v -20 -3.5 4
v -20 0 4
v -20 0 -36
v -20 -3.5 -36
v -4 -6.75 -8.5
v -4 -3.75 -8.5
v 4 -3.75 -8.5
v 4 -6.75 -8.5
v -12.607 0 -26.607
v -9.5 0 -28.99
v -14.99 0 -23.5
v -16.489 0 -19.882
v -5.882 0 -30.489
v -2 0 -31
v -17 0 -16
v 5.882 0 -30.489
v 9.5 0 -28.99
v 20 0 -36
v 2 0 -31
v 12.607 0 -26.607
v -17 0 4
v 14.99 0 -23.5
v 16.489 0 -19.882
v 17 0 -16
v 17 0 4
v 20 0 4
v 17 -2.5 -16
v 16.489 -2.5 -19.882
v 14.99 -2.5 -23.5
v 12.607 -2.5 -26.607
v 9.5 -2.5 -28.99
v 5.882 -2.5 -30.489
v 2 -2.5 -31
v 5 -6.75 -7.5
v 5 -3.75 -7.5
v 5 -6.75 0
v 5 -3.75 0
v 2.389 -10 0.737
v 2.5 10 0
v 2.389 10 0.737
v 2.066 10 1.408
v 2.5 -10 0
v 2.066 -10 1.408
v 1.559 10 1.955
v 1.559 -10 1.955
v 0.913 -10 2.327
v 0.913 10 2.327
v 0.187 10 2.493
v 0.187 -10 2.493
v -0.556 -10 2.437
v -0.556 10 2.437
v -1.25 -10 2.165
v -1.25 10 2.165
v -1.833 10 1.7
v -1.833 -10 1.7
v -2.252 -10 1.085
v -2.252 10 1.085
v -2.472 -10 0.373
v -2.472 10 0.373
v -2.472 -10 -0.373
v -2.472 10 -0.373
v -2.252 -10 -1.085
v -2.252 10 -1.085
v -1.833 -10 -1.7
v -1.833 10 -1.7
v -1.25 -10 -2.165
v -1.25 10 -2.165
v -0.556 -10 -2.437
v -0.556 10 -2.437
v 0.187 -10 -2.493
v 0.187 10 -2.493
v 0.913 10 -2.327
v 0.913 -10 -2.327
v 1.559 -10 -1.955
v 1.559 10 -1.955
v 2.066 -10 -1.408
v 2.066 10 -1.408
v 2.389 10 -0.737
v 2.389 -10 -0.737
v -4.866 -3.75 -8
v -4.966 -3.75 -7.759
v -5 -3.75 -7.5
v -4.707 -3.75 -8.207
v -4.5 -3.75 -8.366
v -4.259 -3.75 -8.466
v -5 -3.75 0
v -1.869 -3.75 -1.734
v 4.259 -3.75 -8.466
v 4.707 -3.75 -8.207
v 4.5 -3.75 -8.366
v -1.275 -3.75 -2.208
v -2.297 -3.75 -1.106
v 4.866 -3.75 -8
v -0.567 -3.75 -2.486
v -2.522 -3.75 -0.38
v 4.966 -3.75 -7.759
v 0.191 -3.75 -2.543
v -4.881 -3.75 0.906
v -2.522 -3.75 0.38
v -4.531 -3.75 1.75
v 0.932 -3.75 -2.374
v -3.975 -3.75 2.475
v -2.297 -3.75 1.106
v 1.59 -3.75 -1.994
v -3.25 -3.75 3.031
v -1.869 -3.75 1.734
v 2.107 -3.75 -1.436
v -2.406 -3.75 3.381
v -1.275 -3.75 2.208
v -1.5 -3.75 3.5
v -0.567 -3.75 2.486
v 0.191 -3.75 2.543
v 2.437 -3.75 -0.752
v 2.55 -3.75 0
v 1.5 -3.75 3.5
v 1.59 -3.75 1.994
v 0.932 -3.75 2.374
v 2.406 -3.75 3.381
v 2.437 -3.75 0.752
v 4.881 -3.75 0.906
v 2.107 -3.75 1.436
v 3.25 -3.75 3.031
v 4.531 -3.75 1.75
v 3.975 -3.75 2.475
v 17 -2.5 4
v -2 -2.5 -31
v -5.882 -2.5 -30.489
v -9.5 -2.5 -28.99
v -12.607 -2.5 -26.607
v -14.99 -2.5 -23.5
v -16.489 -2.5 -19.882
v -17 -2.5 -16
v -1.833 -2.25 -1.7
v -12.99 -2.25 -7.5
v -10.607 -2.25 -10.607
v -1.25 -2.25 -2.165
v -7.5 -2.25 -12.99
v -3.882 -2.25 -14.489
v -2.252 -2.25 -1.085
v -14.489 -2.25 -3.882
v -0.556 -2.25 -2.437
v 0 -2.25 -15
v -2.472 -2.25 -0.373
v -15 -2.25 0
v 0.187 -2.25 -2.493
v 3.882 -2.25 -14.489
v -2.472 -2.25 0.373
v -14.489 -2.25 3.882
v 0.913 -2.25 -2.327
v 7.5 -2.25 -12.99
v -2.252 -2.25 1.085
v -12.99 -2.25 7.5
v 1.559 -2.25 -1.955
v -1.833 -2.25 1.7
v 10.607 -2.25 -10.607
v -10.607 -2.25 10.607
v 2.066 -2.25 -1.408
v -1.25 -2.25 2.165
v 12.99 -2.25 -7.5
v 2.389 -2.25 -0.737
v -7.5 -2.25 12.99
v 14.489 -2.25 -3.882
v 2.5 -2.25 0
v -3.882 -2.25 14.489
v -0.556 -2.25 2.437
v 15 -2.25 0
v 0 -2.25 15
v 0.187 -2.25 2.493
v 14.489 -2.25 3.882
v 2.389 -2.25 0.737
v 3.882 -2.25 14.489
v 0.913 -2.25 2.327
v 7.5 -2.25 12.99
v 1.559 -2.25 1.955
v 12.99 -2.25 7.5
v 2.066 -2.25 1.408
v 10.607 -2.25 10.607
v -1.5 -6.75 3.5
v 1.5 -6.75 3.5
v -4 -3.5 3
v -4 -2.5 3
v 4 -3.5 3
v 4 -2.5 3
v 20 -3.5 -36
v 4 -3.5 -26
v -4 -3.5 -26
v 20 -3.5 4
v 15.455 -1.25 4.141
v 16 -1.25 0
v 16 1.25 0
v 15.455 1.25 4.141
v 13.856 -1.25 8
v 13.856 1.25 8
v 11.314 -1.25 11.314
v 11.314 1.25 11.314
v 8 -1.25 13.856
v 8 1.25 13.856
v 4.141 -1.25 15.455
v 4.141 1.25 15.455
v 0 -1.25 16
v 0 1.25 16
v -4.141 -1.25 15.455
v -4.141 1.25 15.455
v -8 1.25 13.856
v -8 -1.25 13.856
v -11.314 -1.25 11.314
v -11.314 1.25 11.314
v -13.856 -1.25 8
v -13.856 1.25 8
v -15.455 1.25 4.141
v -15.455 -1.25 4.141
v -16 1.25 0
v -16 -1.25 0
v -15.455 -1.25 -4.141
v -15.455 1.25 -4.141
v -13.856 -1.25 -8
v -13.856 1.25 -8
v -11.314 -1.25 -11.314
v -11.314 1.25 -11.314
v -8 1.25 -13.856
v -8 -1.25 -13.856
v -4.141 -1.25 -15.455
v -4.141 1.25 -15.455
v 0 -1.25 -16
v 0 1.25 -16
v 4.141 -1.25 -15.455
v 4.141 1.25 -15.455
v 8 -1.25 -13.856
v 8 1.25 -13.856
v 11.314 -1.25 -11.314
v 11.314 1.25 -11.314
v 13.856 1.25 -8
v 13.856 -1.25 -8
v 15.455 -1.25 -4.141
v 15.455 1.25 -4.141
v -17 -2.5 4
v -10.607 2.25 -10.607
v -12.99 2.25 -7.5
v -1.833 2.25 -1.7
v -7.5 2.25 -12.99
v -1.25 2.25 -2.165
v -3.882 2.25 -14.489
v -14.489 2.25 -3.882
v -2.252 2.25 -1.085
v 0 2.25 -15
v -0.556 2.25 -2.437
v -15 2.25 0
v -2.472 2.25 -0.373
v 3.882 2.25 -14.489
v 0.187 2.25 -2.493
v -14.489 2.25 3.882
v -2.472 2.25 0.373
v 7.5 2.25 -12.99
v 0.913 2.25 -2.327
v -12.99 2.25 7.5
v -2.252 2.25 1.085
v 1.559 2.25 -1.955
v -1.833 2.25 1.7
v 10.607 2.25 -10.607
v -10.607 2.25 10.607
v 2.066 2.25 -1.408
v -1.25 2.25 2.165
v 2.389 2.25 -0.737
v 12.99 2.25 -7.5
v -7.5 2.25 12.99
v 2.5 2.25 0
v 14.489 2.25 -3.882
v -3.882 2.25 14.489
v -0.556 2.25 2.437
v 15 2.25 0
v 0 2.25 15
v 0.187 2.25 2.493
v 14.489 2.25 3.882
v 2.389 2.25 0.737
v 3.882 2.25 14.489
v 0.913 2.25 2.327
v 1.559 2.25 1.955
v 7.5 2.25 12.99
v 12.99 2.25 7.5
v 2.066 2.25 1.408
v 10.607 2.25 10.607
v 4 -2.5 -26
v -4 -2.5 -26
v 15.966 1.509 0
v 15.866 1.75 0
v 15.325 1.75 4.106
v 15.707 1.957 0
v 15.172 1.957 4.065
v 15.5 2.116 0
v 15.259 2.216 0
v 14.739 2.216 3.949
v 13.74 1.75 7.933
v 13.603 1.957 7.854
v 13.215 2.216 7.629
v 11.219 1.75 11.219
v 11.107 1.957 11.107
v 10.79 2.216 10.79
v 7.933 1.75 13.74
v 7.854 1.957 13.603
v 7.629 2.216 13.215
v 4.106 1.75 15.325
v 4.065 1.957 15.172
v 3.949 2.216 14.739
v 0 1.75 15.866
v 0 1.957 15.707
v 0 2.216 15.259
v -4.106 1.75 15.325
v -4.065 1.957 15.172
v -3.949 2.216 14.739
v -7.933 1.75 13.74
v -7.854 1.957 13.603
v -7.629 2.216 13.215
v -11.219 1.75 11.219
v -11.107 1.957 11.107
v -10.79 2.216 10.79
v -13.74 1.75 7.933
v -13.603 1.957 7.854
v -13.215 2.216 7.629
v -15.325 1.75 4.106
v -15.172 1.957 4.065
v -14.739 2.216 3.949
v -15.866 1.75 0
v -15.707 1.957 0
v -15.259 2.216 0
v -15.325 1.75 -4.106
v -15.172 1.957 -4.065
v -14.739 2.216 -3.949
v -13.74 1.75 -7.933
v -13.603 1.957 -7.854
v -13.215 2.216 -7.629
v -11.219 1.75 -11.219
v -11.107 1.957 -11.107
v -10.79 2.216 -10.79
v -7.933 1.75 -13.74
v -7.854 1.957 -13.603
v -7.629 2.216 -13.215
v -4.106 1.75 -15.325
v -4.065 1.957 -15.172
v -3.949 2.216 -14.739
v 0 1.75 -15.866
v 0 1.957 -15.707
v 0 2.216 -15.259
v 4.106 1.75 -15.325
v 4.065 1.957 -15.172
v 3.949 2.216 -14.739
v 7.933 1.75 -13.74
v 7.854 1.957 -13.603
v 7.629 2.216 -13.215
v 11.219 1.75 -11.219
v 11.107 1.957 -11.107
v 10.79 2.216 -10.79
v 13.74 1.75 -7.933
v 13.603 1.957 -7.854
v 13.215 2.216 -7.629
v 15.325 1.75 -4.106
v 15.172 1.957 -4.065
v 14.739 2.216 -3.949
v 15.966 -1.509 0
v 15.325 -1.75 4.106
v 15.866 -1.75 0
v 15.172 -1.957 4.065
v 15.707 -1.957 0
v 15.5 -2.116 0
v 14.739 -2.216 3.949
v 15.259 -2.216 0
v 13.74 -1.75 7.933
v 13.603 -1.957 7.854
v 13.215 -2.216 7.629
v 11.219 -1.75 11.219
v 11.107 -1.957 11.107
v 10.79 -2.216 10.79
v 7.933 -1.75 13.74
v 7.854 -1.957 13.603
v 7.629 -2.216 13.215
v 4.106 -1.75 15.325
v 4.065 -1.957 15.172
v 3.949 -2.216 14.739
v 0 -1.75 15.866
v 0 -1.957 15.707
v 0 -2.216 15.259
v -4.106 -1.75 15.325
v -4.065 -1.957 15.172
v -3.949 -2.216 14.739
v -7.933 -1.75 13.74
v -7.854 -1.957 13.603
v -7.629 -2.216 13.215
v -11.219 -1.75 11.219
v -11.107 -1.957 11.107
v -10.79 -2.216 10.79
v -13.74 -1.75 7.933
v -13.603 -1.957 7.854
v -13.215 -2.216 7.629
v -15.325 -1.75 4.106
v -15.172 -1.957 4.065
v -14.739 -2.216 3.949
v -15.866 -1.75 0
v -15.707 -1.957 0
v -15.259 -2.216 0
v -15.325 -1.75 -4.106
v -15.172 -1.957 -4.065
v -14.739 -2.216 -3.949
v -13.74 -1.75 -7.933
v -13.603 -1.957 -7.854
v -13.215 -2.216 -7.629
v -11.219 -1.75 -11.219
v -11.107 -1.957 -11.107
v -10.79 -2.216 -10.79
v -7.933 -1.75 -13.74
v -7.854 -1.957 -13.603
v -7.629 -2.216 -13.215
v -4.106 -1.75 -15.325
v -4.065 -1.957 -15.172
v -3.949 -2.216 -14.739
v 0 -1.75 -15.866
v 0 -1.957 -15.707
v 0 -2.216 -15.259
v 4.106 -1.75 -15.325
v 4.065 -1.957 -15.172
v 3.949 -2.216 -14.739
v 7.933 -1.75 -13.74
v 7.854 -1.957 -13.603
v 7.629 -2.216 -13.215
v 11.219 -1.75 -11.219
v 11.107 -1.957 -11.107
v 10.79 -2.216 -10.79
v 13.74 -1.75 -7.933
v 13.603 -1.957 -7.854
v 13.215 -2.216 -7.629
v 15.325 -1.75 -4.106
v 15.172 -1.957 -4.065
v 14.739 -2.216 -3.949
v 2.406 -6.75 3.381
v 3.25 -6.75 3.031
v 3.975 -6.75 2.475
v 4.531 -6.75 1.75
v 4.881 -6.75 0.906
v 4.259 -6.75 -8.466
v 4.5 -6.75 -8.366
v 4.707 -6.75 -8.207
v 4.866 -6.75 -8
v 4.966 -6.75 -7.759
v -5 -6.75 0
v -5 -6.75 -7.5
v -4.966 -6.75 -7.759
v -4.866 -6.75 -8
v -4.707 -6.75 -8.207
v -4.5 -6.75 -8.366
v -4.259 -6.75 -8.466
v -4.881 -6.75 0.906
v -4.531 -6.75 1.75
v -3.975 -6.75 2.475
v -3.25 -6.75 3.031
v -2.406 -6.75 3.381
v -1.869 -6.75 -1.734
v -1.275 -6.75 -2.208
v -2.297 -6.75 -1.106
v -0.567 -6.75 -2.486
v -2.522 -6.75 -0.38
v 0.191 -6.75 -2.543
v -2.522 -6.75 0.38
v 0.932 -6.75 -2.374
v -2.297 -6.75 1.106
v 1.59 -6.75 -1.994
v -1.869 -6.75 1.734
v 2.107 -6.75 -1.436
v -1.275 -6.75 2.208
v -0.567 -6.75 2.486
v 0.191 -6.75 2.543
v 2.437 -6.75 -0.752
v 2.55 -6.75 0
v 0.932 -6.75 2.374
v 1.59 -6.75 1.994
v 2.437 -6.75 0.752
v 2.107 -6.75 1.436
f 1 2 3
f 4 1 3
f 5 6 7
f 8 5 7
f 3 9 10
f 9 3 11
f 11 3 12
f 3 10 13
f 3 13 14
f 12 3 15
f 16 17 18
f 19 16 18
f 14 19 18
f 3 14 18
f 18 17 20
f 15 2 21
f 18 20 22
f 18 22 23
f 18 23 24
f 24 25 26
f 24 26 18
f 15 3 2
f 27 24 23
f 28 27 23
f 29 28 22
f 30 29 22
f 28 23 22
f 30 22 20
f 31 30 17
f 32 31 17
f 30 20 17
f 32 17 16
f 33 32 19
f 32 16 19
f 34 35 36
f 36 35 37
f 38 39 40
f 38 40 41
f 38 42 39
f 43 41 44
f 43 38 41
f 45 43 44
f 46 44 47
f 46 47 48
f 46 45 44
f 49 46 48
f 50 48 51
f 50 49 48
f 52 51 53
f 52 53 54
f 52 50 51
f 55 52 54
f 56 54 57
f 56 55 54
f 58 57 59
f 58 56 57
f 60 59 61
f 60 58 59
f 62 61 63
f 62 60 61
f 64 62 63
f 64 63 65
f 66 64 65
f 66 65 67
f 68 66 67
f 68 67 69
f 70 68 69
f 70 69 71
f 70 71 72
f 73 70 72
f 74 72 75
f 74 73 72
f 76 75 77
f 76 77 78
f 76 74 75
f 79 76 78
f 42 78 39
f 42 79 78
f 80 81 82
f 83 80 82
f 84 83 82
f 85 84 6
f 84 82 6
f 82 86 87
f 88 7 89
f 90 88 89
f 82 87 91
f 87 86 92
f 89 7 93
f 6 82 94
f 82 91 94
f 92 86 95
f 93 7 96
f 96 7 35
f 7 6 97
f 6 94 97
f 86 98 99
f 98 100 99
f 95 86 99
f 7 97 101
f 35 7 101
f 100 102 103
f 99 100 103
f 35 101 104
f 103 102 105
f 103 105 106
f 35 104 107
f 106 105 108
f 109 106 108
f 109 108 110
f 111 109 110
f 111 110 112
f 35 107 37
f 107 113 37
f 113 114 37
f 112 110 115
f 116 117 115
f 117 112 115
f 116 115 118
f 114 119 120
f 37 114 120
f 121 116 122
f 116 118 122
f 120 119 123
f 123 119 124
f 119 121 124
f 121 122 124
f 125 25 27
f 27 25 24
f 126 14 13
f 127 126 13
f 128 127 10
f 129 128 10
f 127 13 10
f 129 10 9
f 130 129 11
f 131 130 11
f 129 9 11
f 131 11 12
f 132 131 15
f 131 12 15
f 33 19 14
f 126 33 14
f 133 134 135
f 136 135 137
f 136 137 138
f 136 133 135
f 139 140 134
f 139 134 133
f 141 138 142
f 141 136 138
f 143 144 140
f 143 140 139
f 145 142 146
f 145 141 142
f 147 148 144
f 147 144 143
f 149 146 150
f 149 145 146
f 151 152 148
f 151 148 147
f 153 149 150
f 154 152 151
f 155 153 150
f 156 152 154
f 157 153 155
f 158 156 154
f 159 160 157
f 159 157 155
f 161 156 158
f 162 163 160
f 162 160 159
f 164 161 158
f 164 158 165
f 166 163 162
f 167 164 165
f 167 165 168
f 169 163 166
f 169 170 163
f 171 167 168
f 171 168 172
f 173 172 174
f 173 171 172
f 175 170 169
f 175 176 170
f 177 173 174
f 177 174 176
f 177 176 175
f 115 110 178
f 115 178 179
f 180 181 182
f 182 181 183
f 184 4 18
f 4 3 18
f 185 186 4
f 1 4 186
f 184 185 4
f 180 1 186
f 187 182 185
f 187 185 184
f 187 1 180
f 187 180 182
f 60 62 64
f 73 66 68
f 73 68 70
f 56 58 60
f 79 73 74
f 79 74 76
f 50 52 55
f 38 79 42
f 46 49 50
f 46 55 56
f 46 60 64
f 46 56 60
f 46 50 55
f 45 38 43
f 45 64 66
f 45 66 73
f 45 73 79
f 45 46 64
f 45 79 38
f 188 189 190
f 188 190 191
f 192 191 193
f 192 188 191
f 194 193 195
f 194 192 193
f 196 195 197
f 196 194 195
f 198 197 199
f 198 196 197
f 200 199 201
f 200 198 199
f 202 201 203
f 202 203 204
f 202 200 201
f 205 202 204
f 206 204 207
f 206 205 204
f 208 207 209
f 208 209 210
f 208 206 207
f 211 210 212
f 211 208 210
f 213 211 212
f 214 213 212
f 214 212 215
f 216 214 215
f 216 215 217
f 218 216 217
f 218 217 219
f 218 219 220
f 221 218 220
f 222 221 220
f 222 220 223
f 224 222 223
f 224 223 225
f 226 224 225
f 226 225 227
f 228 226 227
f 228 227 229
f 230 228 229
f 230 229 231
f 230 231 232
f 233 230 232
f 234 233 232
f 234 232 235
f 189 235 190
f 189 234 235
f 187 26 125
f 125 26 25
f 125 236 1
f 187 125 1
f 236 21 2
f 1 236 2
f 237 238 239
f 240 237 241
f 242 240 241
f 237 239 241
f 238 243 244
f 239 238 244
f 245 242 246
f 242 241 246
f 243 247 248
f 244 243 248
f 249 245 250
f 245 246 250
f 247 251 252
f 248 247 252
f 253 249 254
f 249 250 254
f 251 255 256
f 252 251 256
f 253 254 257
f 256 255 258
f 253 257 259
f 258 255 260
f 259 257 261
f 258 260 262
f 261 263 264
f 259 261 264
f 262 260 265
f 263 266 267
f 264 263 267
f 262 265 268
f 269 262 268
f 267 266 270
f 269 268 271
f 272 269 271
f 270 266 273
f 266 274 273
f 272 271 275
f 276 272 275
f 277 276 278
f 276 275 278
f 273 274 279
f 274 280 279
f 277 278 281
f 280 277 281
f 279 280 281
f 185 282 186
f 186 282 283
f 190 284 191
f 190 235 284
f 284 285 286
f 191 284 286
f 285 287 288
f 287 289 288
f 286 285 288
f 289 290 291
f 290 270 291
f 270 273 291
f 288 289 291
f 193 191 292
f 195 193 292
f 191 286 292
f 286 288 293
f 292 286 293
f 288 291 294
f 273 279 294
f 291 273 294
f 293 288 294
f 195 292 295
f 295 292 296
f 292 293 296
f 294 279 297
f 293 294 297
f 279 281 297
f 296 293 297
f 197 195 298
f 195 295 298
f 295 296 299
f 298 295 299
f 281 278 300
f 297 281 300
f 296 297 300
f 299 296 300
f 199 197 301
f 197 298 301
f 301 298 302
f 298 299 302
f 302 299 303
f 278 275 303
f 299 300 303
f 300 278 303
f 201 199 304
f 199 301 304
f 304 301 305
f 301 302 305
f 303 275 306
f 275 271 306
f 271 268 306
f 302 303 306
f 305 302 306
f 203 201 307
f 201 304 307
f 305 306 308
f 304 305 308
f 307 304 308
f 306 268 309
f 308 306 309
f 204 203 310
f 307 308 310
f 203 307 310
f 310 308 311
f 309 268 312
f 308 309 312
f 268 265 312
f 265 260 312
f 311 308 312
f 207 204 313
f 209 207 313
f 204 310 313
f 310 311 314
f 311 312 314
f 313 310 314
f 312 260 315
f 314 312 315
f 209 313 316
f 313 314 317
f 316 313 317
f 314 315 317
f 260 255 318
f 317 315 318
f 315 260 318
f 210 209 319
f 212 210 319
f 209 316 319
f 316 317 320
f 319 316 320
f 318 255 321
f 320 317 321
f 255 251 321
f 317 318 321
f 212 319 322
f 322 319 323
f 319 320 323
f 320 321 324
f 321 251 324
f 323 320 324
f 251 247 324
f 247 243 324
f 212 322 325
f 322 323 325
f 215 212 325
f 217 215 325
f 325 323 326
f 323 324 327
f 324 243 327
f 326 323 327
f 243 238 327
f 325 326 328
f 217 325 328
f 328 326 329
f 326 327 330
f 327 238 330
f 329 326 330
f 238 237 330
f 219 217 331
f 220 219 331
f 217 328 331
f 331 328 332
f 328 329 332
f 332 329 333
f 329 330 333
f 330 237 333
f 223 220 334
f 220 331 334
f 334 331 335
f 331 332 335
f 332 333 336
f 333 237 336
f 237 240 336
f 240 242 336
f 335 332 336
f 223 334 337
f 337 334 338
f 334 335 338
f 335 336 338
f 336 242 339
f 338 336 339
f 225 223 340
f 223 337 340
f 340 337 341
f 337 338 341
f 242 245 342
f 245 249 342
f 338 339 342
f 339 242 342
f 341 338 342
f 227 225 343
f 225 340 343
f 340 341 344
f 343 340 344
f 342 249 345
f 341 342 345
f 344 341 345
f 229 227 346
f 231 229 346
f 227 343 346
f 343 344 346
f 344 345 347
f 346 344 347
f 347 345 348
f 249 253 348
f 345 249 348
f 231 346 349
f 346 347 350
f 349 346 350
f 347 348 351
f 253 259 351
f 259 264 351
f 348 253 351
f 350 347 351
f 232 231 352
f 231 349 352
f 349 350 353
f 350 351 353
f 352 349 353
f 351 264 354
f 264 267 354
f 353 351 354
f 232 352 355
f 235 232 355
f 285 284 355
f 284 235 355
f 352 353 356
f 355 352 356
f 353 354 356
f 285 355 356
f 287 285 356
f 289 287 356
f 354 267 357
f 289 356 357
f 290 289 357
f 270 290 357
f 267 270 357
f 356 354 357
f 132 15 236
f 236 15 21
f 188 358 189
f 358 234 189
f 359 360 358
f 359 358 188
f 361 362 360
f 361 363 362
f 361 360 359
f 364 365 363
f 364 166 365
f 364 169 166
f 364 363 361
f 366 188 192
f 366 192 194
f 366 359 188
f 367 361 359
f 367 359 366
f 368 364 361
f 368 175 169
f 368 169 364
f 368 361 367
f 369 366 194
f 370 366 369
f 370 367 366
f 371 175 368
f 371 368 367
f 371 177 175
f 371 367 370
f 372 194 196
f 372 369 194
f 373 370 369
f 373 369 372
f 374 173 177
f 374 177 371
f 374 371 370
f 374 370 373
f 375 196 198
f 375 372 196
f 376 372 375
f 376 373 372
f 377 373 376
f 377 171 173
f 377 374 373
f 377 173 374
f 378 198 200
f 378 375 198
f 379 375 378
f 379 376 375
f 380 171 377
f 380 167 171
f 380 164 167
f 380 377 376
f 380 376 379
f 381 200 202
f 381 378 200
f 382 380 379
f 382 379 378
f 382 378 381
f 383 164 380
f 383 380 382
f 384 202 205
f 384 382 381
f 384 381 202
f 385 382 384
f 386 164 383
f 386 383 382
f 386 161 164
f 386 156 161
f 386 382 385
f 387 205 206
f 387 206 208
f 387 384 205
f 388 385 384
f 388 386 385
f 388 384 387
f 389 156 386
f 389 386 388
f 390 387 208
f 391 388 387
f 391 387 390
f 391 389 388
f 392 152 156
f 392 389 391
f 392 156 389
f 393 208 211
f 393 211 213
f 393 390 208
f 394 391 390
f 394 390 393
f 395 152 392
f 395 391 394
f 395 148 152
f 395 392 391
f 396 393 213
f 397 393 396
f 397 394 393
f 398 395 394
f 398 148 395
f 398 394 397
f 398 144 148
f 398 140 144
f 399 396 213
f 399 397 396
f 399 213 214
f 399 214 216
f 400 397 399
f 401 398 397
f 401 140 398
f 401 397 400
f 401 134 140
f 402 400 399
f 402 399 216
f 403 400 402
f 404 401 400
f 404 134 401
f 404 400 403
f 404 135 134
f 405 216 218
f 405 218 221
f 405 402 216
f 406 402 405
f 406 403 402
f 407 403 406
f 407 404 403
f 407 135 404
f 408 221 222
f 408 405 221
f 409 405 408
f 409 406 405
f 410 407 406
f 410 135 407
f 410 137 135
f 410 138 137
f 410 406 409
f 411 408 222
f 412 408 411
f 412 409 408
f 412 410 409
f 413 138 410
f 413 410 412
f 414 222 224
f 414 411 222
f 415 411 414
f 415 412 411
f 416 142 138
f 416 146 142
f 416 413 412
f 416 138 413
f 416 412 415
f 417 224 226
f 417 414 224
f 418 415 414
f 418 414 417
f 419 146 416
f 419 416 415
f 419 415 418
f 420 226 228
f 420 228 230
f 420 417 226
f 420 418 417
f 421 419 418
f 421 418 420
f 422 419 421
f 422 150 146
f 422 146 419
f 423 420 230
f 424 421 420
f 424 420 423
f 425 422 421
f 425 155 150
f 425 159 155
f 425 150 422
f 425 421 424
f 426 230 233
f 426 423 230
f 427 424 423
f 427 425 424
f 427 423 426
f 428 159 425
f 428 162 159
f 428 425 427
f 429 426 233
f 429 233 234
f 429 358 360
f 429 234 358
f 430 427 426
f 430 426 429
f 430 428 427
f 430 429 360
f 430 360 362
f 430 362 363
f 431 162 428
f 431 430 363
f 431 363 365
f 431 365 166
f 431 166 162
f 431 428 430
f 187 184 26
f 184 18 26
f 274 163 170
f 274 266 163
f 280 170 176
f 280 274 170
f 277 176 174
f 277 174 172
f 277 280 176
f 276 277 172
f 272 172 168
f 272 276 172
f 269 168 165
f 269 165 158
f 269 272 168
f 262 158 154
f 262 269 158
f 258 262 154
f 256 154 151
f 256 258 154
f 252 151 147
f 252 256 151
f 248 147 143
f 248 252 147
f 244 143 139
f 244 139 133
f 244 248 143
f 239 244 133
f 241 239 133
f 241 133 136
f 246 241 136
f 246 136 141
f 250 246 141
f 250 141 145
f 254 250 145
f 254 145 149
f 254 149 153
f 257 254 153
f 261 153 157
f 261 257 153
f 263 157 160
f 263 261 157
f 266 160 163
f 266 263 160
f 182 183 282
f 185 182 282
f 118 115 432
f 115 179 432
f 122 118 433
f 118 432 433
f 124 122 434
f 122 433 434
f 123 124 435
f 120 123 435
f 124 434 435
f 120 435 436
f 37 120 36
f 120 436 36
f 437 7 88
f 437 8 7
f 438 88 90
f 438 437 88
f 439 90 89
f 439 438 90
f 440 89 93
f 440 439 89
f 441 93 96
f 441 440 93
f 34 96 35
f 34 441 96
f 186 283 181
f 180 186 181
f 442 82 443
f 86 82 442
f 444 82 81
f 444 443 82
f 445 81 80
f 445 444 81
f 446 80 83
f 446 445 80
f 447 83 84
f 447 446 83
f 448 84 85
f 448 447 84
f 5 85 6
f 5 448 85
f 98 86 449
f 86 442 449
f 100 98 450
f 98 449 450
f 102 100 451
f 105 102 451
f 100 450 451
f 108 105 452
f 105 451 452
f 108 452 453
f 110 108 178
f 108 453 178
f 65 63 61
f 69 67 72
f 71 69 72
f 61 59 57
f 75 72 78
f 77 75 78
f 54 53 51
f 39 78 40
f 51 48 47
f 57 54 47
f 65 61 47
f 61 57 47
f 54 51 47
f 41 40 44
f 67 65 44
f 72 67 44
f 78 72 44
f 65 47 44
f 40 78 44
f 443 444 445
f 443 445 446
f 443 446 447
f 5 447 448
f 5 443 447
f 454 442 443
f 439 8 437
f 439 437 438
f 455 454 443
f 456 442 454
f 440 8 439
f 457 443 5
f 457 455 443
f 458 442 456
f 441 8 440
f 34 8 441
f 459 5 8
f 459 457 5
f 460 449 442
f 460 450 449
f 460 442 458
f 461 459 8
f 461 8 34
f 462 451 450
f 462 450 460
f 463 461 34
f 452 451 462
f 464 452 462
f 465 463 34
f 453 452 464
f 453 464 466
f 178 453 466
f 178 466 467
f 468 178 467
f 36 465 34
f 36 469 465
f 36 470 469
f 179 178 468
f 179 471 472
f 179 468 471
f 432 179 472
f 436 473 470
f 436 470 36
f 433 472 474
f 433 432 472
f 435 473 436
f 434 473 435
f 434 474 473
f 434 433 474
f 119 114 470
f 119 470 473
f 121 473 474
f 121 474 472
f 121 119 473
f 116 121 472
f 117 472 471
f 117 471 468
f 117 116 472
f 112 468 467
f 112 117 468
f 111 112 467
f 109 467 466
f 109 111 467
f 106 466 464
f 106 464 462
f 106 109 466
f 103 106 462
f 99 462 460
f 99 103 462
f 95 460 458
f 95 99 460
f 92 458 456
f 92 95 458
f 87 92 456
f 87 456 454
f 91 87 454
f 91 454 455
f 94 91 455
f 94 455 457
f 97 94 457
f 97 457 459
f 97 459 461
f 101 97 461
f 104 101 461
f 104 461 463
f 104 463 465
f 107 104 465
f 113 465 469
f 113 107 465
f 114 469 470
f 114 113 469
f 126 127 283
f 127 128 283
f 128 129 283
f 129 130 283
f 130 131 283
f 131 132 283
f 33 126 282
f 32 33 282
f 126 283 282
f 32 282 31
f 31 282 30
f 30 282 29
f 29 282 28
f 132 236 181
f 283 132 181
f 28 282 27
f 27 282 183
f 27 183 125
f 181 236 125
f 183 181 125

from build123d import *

# Parameters (mm, degrees)
F0_R      = 16
F0_R_2    = 2.5
F1_DEPTH  = 2.25
F2_R      = 2.5
F3_DEPTH  = 10
F5_W      = 10
F5_H      = 12
F5_R      = 2.55
F6_DEPTH  = 3
F7_R      = 3.5
F8_R      = 1
F8_2_R    = 1
F10_DEPTH = 2.5
F11_W     = 8
F11_H     = 1
F12_DEPTH = 1


with BuildPart() as f1:
    # F0 (on Front) → F1 (new body, symmetric)
    with BuildSketch(Plane.XZ):
        Circle(F0_R)
        Circle(F0_R_2, mode=Mode.SUBTRACT)
    extrude(amount=F1_DEPTH, both=True)

    # F8
    f8_edges = [f1.edges().sort_by_distance(p)[0] for p in [
        (-16, -2.25, 0),
        (-16, 2.25, 0),
    ]]
    fillet(f8_edges, radius=F8_R)


with BuildPart() as f3:
    # F2 (on Front) → F3 (new body, symmetric)
    with BuildSketch(Plane.XZ):
        Circle(F2_R)
    extrude(amount=F3_DEPTH, both=True)


with BuildPart() as f6:
    # F5 (on offset) → F6 (new body)
    with BuildSketch(Plane.XZ.offset(3.75)):
        with Locations((0, -2.5)):
            Rectangle(F5_W, F5_H)
        Circle(F5_R, mode=Mode.SUBTRACT)
    extrude(amount=F6_DEPTH)

    # F7
    f7_edges = [f6.edges().sort_by_distance(p)[0] for p in [
        (-5, -5.25, 3.5),
        (5, -5.25, 3.5),
    ]]
    fillet(f7_edges, radius=F7_R)

    # F8#2
    f8_2_edges = [f6.edges().sort_by_distance(p)[0] for p in [
        (5, -5.25, -8.5),
        (-5, -5.25, -8.5),
    ]]
    fillet(f8_2_edges, radius=F8_2_R)


with BuildPart() as f10:
    # F9 (on Front) → F10 (new body)
    with BuildSketch(Plane.XZ):
        with BuildLine():
            Line((20, -36), (20, 4))
            Line((20, 4), (17, 4))
            Line((17, 4), (17, -16))
            ThreePointArc((17, -16), (12.606602, -26.606602), (2, -31))
            Line((2, -31), (-2, -31))
            ThreePointArc((-2, -31), (-12.606602, -26.606602), (-17, -16))
            Line((-17, -16), (-17, 4))
            Line((-17, 4), (-20, 4))
            Line((-20, 4), (-20, -36))
            Line((-20, -36), (20, -36))
        make_face()
    extrude(amount=F10_DEPTH)

    # F11 (on face) → F12 (join)
    with BuildSketch(Plane.XZ.offset(2.5)):
        with BuildLine():
            Line((-17, 4), (-20, 4))
            Line((-20, 4), (-20, -36))
            Line((-20, -36), (20, -36))
            Line((20, -36), (20, 4))
            Line((20, 4), (17, 4))
            Line((17, 4), (17, -16))
            ThreePointArc((17, -16), (12.606602, -26.606602), (2, -31))
            Line((2, -31), (-2, -31))
            ThreePointArc((-2, -31), (-12.606602, -26.606602), (-17, -16))
            Line((-17, -16), (-17, 4))
        make_face()
        with BuildLine():
            Line((-4, 4), (-17, 4))
            Line((-17, 4), (-17, -16))
            ThreePointArc((-17, -16), (-12.606602, -26.606602), (-2, -31))
            Line((-2, -31), (2, -31))
            ThreePointArc((2, -31), (12.606602, -26.606602), (17, -16))
            Line((17, -16), (17, 4))
            Line((17, 4), (4, 4))
            Line((4, 4), (4, 3))
            Line((4, 3), (4, -26))
            Line((4, -26), (-4, -26))
            Line((-4, -26), (-4, 3))
            Line((-4, 3), (-4, 4))
        make_face()
        with Locations((0, 3.5)):
            Rectangle(F11_W, F11_H)
    extrude(amount=F12_DEPTH)


solid = Compound([f1.part, f3.part, f6.part, f10.part])
